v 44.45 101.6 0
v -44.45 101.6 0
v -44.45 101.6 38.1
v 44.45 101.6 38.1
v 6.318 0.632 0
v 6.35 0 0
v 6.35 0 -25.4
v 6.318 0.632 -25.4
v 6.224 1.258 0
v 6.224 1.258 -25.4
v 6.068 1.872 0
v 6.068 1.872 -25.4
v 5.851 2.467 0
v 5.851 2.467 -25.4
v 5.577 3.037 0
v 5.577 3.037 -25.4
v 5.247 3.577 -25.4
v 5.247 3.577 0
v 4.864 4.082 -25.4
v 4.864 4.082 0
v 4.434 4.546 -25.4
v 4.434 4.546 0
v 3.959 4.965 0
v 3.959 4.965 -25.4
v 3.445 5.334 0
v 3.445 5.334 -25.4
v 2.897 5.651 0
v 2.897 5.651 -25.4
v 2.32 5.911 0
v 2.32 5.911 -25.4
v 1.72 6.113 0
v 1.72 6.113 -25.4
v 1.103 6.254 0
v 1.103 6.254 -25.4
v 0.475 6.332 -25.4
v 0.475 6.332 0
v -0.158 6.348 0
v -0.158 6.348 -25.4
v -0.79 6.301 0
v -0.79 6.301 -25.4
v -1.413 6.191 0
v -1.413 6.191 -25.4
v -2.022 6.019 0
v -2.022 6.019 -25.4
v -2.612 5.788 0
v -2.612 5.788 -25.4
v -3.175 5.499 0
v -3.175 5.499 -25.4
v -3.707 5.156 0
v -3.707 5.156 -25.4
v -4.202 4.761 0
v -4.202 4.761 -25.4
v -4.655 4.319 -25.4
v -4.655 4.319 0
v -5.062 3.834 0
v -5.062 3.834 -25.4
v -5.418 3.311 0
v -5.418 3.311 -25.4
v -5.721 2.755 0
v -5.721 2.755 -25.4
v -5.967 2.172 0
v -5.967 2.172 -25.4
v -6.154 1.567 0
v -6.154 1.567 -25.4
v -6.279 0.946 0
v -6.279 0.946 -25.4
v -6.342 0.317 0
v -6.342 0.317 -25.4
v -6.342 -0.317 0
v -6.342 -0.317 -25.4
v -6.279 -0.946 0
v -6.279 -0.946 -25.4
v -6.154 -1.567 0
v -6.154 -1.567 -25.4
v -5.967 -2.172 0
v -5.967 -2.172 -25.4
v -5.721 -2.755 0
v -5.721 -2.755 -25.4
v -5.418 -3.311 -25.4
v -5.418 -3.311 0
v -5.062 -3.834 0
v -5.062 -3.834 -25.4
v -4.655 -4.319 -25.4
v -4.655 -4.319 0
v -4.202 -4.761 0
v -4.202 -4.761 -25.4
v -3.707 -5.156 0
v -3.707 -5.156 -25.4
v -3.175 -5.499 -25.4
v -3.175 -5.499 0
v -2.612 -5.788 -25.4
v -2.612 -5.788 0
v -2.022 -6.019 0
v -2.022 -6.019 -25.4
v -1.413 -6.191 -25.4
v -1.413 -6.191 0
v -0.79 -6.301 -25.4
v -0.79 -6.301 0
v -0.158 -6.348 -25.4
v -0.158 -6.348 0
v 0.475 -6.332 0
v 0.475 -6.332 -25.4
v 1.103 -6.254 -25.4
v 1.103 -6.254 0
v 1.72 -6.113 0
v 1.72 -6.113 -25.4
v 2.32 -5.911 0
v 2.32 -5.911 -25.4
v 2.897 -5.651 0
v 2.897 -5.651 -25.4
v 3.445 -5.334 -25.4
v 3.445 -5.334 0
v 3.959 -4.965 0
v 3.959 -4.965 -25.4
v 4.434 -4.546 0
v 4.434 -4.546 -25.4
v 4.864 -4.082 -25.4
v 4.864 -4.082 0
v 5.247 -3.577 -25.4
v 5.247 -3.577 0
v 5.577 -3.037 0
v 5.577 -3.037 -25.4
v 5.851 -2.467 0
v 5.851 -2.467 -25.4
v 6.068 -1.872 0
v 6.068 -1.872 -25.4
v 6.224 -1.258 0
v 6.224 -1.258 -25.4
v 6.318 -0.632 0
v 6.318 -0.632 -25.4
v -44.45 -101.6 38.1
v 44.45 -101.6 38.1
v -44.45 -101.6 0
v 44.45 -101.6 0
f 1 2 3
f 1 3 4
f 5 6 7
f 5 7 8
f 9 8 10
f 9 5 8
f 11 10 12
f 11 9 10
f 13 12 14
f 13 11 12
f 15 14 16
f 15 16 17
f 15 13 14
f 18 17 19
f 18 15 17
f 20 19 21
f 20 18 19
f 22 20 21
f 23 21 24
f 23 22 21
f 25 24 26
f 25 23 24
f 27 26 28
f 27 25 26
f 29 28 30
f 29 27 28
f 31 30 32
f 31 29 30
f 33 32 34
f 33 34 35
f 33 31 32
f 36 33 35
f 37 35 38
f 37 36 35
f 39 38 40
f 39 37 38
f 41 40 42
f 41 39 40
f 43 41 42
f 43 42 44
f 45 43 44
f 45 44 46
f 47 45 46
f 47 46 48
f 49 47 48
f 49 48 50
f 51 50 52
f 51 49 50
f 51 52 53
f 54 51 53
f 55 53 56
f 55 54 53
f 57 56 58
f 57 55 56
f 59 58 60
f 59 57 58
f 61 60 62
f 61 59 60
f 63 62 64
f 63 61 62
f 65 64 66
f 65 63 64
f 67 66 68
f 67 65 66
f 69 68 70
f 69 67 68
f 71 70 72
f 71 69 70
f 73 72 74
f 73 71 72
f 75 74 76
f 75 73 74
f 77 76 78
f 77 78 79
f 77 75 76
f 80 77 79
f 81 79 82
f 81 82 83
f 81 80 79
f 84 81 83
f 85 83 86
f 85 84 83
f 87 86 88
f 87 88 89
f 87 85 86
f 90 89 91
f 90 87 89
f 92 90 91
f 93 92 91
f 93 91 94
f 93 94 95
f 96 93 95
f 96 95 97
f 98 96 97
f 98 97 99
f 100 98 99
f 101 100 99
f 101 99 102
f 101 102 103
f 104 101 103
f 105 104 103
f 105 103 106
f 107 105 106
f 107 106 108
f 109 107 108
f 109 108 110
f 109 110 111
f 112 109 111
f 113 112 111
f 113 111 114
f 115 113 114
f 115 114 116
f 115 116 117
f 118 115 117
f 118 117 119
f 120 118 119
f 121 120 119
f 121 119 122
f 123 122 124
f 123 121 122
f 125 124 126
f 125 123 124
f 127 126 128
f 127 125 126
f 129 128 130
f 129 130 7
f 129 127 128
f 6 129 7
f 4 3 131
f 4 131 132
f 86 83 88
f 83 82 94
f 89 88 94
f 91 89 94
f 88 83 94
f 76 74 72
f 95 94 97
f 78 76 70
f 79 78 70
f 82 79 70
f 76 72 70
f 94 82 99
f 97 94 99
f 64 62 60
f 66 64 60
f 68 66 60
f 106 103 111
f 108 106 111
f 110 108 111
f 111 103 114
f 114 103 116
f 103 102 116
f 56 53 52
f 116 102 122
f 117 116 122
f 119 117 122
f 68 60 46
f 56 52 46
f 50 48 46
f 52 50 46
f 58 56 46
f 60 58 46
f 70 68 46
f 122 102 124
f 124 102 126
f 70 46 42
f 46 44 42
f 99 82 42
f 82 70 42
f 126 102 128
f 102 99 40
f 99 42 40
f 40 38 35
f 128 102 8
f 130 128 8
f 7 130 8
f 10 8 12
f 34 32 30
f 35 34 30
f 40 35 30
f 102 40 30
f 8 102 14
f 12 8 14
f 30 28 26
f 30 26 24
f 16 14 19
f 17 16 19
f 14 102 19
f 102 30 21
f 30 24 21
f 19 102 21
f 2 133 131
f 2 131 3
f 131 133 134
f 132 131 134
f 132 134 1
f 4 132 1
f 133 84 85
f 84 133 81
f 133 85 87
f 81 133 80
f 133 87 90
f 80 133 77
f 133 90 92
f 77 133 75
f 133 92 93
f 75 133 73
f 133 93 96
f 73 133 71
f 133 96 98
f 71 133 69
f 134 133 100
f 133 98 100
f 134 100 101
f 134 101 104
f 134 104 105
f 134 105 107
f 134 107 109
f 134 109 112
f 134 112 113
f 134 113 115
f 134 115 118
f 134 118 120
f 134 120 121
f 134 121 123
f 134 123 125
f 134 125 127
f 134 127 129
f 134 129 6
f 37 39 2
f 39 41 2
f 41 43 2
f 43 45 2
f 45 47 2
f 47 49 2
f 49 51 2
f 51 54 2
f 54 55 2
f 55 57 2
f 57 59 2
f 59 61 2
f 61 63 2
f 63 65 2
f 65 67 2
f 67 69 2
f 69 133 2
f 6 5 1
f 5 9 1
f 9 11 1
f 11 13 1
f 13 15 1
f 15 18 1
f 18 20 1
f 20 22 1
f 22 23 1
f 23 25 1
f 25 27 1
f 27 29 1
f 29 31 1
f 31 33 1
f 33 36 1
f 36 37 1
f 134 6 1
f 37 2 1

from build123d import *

# Parameters (mm, degrees)
F0_W     = 88.9
F0_H     = 203.2
F1_DEPTH = 38.1
F2_R     = 6.35
F3_DEPTH = 25.4


with BuildPart() as f1:
    # F0 (on Top) → F1 (new body)
    with BuildSketch(Plane.XY):
        Rectangle(F0_W, F0_H)
    extrude(amount=F1_DEPTH)

    # F2 (on Top) → F3 (join)
    with BuildSketch(Plane.XY):
        Circle(F2_R)
    extrude(amount=-F3_DEPTH)


solid = f1.part
